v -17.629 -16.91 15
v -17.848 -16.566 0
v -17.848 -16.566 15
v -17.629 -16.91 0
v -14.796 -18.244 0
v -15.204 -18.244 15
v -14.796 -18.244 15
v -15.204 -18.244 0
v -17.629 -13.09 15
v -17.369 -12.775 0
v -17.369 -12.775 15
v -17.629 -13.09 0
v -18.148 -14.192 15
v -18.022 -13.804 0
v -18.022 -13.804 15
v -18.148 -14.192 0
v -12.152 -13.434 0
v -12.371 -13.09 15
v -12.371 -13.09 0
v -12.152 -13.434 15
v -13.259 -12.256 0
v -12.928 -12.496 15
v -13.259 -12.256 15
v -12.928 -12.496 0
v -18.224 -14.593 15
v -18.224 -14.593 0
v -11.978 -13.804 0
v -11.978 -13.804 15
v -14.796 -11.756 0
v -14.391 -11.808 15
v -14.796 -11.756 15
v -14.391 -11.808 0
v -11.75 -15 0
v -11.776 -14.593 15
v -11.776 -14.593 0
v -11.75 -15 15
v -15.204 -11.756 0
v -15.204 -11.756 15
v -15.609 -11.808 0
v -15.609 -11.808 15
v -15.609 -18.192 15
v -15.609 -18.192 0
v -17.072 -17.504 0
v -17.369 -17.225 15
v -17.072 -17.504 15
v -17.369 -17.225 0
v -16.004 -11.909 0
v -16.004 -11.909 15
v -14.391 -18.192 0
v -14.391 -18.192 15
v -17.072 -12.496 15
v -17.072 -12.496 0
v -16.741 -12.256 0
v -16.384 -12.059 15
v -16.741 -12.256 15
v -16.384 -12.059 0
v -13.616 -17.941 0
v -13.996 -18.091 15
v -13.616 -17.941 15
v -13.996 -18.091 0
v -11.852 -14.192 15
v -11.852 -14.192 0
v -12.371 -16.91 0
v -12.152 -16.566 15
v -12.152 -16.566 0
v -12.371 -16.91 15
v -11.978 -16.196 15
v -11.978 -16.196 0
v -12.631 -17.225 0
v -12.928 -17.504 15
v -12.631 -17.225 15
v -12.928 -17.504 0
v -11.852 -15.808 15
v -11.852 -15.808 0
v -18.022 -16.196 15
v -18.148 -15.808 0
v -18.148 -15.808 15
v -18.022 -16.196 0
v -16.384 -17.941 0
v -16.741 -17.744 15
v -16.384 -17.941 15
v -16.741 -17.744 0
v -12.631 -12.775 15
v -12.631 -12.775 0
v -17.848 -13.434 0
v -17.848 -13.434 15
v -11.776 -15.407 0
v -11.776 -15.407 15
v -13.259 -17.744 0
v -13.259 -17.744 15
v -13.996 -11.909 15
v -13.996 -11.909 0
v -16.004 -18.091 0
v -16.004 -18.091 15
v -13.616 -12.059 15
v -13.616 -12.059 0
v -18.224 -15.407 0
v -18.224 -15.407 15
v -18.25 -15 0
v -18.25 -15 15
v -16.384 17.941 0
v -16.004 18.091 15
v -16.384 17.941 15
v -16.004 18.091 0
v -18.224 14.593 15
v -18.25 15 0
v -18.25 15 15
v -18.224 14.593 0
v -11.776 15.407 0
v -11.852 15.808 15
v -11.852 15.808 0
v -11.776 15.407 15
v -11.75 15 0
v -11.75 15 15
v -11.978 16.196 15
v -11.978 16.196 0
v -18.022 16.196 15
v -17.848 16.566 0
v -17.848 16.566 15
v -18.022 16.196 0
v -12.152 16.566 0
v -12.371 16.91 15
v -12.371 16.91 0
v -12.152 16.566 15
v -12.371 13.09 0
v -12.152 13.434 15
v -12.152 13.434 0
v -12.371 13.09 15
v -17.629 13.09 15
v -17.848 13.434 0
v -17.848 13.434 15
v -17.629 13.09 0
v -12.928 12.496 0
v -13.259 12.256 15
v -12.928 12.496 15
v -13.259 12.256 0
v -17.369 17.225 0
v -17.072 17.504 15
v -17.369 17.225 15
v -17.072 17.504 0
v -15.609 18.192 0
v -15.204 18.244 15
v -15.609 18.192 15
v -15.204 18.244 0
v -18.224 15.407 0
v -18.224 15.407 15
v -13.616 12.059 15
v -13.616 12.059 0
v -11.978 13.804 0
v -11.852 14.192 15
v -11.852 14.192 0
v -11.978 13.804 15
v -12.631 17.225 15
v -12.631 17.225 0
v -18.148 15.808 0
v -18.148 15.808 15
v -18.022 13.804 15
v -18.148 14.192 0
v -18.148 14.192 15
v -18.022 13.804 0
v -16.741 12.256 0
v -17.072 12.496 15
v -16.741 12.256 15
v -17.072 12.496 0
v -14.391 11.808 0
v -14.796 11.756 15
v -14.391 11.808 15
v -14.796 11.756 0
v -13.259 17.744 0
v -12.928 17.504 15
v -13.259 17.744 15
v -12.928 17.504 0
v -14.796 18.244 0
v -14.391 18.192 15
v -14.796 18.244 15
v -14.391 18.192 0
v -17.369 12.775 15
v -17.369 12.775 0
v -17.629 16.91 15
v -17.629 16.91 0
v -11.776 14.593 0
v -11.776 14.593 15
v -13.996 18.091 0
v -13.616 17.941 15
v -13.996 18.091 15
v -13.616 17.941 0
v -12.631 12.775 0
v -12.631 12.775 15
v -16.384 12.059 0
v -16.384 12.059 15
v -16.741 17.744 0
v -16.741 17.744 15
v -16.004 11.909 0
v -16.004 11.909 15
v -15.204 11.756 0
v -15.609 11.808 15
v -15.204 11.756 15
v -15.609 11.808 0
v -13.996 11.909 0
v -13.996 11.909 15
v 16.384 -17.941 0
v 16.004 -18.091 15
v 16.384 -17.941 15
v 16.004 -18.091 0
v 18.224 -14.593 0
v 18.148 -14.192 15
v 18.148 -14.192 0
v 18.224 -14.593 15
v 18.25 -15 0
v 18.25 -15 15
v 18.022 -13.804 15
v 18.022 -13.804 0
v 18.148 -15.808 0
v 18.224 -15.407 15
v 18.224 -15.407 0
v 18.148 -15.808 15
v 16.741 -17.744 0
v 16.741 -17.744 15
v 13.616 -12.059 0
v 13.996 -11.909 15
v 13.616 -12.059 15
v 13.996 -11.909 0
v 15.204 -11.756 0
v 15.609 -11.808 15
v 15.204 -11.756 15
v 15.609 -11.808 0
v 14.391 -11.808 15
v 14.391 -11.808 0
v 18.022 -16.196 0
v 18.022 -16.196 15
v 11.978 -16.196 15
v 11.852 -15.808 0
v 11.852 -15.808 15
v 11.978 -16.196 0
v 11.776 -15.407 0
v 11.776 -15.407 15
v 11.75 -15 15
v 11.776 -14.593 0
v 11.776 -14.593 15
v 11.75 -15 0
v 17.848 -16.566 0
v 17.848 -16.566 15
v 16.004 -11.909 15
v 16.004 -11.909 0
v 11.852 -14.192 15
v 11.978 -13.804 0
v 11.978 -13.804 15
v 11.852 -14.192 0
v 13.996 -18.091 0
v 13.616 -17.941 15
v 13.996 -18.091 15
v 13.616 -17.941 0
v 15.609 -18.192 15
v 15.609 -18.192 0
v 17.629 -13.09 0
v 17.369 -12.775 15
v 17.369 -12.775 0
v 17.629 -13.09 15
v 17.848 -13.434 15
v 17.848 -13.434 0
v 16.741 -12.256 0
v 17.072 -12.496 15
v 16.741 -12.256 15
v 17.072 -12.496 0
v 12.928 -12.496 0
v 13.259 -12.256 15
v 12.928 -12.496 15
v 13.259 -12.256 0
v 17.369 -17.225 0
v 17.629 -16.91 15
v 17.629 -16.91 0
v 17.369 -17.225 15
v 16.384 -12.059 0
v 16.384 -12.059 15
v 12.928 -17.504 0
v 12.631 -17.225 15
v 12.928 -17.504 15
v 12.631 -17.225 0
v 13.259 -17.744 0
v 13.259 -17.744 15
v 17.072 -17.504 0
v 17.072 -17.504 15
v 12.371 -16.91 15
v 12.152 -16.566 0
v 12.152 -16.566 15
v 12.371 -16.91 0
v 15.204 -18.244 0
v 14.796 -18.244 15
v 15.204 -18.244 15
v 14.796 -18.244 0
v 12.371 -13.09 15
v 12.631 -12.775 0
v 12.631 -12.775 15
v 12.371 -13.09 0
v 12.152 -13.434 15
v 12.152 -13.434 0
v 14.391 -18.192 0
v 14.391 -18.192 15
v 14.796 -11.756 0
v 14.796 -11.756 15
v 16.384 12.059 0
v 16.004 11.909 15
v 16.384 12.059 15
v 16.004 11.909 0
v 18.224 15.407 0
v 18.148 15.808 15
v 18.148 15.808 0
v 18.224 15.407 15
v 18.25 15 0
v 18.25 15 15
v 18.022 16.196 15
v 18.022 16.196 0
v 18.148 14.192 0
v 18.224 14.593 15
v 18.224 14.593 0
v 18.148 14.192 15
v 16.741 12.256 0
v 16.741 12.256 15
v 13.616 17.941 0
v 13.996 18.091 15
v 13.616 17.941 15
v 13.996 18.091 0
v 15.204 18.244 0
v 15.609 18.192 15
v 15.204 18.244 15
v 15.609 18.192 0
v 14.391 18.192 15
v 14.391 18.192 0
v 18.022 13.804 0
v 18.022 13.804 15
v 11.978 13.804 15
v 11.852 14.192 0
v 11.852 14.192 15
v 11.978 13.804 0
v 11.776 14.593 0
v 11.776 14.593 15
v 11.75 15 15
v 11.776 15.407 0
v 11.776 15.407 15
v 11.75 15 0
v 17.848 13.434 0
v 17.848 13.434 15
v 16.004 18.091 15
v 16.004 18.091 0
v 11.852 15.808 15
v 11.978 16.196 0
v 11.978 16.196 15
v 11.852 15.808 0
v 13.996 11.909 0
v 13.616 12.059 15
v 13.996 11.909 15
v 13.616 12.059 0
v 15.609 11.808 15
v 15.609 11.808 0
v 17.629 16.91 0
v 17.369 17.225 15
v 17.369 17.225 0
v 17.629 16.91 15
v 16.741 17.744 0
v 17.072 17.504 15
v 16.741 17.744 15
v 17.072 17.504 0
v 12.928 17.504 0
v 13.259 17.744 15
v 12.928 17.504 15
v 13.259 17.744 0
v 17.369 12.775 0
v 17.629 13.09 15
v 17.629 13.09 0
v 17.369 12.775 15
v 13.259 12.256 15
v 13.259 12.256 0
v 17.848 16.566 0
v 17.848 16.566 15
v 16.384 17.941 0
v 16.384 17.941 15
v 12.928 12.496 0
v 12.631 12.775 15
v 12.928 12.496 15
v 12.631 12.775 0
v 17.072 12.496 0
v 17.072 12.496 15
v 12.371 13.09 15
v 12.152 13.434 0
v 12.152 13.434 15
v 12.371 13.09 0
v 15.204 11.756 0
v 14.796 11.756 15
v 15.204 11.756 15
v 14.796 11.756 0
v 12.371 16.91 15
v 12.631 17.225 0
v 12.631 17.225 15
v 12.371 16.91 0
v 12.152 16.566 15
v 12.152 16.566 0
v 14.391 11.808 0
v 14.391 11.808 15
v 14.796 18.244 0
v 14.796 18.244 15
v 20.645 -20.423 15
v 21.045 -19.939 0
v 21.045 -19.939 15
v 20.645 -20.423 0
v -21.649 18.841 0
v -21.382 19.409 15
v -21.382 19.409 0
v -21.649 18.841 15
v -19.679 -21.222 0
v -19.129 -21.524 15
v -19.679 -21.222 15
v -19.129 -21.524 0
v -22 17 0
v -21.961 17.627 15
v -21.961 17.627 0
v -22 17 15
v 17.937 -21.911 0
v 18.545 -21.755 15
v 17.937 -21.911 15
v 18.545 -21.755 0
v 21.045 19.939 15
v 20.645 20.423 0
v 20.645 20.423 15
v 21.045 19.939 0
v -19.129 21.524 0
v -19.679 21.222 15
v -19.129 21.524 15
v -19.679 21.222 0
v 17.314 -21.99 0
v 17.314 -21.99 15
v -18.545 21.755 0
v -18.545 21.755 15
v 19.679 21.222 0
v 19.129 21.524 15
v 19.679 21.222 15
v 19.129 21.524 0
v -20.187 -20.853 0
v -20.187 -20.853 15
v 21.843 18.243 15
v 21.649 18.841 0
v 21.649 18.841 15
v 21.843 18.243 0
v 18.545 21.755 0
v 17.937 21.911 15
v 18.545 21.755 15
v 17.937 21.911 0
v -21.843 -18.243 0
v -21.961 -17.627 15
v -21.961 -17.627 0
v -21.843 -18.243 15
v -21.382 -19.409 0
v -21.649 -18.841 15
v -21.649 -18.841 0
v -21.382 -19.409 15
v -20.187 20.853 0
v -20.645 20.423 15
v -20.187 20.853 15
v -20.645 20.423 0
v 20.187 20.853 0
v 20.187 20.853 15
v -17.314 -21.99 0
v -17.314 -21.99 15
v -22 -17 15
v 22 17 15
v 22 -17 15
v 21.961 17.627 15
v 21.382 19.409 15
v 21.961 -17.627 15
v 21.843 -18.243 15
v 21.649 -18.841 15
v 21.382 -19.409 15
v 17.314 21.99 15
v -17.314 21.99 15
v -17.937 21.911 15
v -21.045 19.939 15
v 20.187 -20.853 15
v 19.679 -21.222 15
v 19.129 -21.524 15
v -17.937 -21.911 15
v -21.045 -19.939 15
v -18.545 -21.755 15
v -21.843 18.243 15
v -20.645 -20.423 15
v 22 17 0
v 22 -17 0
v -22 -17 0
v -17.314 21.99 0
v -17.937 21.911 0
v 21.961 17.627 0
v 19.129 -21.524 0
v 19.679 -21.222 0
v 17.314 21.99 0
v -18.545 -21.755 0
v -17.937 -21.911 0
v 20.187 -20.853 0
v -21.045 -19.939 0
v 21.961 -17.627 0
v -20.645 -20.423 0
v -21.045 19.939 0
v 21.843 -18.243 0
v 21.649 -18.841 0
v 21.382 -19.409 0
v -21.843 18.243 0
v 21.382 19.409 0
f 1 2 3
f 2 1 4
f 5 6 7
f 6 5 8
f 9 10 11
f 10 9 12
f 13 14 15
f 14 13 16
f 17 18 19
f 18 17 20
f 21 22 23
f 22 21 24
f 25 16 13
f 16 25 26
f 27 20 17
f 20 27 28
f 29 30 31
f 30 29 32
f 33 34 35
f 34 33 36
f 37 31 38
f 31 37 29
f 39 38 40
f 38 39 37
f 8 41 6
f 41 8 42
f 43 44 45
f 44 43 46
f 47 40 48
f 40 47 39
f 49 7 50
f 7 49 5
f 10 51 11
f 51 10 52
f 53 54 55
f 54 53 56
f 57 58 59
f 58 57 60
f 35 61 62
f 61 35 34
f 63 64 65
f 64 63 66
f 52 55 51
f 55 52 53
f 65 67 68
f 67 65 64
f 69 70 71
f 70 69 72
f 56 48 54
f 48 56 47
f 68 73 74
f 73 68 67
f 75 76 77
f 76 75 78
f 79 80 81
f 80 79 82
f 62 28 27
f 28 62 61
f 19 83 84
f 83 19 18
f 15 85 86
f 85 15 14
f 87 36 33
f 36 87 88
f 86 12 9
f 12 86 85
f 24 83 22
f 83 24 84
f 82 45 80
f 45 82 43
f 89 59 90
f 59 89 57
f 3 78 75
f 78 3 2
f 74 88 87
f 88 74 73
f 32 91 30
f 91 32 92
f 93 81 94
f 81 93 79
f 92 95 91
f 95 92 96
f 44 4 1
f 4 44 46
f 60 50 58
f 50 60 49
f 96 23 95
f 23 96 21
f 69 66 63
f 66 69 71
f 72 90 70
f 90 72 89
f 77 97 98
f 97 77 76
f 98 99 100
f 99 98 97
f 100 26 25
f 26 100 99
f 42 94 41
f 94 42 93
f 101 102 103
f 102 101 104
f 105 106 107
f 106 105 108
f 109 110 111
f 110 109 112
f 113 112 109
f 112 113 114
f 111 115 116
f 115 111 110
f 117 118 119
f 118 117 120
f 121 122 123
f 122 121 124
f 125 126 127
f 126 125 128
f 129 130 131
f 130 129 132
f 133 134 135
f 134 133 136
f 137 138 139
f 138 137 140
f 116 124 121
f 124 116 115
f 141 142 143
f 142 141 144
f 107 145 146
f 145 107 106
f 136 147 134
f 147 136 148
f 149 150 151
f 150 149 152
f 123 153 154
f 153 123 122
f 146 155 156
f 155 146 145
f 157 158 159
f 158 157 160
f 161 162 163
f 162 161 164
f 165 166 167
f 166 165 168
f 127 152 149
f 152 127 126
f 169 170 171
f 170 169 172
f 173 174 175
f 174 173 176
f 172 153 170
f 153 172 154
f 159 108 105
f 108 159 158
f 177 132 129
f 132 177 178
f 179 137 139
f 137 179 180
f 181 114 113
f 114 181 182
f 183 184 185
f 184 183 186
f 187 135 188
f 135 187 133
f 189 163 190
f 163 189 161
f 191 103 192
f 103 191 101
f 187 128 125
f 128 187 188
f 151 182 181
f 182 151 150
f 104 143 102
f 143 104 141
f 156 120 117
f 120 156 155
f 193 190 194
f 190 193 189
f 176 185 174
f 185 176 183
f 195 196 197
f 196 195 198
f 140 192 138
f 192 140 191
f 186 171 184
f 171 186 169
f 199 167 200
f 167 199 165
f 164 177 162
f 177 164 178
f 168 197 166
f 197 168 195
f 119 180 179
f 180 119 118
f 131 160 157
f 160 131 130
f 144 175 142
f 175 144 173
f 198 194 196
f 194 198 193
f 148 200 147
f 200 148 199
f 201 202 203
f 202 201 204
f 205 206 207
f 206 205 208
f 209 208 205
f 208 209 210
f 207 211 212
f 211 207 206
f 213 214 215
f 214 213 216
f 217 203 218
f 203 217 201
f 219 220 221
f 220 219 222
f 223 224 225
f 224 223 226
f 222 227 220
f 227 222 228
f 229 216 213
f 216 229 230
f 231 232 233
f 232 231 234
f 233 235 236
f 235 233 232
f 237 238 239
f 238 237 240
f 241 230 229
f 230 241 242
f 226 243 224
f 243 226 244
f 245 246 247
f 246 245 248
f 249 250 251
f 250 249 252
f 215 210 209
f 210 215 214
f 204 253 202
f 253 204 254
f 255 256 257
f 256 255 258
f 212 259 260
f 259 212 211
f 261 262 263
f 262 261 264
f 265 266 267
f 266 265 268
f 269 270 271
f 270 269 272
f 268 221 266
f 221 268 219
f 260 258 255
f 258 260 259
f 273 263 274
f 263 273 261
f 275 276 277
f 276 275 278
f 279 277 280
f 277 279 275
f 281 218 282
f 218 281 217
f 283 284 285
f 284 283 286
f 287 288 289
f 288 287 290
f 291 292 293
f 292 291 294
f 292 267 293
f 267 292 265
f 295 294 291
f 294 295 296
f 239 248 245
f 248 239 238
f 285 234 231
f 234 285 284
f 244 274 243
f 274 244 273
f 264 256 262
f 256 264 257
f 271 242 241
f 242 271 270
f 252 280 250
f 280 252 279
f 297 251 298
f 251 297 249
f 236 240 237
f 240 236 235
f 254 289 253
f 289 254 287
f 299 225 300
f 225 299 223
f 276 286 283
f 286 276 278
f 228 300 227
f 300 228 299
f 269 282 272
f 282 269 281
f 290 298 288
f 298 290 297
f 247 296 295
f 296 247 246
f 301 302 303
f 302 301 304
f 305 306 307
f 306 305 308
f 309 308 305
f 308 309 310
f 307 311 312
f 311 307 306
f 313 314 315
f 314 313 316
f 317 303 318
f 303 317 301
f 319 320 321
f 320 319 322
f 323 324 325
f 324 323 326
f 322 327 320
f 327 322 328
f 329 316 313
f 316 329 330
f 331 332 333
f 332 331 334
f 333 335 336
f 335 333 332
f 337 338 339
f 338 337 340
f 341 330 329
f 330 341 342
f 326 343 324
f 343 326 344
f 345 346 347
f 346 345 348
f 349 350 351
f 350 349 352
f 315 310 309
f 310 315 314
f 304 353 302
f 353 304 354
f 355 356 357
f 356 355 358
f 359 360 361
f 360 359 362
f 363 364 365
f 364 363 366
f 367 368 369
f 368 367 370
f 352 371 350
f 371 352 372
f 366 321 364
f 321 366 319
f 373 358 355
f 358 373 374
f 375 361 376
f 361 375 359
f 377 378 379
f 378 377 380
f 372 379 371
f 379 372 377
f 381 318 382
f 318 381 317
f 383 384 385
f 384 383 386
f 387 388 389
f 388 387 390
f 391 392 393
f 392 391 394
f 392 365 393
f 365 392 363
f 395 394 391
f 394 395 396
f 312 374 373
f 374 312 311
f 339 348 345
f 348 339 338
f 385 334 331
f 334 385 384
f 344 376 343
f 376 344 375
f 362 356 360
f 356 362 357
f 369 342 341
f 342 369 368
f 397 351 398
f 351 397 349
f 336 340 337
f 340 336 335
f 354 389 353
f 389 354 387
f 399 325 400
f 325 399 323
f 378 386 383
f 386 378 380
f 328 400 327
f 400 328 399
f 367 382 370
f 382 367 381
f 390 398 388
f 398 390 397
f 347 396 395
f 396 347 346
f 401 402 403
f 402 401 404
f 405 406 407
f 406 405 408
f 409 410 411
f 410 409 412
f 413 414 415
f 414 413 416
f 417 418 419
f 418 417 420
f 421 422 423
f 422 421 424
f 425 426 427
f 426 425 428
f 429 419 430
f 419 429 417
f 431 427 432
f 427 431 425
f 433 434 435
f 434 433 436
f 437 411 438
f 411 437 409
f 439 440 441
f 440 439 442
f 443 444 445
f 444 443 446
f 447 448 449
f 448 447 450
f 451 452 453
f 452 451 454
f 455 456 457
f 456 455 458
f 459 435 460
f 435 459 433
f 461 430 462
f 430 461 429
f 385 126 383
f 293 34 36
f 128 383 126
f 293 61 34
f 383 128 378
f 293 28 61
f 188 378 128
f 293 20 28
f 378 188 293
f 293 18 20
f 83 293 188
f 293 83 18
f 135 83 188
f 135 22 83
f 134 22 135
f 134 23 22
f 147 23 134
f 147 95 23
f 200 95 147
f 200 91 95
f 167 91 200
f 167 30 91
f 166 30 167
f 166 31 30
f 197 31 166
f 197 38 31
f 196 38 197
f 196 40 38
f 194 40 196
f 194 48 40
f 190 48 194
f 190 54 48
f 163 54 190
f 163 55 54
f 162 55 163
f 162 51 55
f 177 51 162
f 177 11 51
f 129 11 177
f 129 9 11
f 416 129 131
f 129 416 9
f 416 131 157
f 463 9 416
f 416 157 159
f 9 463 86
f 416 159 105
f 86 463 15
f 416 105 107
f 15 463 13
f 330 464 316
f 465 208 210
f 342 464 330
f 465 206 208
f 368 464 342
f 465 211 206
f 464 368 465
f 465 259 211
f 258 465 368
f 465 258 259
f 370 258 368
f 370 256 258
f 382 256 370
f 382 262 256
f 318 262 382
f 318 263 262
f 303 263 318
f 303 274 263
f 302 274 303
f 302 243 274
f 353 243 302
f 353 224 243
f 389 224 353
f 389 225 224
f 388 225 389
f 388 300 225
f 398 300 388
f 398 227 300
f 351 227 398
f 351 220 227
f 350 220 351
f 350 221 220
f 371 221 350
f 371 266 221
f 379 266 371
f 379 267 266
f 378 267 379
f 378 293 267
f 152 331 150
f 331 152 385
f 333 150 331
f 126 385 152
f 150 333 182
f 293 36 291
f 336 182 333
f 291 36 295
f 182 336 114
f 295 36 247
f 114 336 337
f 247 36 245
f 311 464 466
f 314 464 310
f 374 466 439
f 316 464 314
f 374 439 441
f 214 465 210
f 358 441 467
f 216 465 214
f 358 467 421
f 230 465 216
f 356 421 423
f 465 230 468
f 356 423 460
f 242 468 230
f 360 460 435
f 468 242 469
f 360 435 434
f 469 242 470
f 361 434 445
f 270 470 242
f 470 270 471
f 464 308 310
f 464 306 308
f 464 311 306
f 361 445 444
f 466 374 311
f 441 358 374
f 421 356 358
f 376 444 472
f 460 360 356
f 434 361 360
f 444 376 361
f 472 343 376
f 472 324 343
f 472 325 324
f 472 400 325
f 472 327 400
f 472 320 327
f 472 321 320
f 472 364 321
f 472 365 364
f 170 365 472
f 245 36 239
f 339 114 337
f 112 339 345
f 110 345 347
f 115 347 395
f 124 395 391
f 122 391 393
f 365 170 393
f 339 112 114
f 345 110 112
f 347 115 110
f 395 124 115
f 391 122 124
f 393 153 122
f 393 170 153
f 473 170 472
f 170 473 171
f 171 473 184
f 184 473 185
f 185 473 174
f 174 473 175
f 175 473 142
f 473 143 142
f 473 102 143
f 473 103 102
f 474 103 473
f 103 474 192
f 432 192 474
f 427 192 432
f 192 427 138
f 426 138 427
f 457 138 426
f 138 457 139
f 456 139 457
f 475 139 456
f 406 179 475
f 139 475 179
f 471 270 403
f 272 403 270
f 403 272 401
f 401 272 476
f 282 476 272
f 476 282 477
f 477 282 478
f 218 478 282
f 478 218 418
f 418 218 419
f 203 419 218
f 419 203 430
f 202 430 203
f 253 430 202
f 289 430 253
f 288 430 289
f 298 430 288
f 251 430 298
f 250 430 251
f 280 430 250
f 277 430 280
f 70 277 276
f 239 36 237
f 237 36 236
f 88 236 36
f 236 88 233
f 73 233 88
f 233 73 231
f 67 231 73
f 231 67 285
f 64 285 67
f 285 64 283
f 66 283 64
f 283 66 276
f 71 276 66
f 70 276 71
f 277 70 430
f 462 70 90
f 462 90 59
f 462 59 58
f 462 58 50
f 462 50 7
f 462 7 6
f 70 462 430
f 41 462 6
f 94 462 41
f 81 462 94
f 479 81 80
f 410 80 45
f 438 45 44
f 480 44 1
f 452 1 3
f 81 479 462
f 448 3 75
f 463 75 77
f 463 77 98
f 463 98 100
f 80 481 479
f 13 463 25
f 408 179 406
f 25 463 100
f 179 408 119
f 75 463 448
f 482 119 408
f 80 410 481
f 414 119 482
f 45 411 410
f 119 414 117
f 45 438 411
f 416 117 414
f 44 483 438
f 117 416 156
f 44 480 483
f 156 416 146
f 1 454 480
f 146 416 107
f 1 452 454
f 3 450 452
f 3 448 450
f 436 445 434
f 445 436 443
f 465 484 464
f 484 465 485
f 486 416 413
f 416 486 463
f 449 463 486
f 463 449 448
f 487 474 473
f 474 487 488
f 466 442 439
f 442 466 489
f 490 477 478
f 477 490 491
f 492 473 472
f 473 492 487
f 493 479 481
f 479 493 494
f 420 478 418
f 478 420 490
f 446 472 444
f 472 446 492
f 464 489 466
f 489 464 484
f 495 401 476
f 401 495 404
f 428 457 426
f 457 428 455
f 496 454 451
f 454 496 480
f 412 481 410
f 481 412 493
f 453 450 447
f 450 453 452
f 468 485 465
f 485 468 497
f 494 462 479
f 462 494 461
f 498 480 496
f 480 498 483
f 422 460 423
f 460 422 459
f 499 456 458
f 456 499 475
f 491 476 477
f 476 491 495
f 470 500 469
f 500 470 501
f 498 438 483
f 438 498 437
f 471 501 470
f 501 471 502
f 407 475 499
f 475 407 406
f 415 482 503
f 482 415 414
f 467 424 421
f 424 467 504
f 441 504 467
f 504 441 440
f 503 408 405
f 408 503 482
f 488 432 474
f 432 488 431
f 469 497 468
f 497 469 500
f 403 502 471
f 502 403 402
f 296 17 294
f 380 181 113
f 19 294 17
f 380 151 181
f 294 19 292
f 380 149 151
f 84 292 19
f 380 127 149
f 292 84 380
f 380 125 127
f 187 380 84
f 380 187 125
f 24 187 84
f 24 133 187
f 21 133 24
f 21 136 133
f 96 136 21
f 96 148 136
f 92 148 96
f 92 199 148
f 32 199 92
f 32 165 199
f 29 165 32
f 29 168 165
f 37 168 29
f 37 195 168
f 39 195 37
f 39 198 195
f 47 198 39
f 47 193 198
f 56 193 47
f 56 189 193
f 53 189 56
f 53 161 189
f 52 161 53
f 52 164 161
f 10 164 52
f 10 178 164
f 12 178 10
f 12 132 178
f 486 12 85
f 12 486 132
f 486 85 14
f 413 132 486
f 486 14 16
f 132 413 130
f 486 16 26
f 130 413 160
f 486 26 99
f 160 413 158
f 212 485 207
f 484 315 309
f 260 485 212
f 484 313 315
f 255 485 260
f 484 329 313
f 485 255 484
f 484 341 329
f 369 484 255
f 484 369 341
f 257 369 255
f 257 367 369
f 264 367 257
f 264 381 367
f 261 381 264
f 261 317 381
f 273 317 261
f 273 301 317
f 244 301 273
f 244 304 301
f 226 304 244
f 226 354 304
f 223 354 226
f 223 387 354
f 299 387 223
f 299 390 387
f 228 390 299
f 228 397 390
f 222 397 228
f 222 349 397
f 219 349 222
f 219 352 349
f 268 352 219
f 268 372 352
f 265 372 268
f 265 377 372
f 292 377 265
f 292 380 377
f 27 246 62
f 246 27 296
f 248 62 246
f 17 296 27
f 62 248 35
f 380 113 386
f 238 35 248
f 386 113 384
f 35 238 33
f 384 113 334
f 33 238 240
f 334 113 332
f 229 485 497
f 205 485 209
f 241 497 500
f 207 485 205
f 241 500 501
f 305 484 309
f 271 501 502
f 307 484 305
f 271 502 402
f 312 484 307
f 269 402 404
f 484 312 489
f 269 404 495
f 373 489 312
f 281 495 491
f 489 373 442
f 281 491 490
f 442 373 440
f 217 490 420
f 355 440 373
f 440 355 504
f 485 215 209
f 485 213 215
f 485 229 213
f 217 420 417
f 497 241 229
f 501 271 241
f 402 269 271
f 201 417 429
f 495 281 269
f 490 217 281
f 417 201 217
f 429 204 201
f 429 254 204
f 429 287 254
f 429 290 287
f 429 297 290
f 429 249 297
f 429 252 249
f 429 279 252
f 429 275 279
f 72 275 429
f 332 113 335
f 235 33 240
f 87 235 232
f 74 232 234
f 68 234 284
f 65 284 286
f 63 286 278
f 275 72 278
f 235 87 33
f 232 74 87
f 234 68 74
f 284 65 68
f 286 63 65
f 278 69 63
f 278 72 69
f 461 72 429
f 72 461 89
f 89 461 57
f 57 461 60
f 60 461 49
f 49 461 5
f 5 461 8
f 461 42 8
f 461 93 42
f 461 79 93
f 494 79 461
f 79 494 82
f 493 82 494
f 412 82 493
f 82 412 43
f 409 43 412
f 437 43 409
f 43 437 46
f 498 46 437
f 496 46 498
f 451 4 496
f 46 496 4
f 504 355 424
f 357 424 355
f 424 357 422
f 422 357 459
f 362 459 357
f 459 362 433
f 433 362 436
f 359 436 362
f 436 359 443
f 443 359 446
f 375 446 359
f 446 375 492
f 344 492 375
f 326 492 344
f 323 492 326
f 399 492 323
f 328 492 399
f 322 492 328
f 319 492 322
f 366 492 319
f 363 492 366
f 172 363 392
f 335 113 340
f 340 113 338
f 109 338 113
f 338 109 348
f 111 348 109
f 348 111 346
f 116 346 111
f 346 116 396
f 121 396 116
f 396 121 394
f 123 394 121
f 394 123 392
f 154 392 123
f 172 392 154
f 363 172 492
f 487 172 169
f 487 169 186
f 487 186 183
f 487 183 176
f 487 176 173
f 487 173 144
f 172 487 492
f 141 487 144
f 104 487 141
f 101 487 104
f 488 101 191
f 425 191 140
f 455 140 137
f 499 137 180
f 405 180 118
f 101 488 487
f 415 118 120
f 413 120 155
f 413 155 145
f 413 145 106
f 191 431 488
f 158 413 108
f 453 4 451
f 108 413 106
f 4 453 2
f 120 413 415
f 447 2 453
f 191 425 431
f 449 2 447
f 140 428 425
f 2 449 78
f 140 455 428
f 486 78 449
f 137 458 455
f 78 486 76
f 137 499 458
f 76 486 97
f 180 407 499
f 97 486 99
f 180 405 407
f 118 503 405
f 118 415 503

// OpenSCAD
$fn = 50;


difference() {
	union() {
		hull() {
			translate(v = [-17.0000000000, 17.0000000000, 0]) {
				cylinder(h = 15, r = 5);
			}
			translate(v = [17.0000000000, 17.0000000000, 0]) {
				cylinder(h = 15, r = 5);
			}
			translate(v = [-17.0000000000, -17.0000000000, 0]) {
				cylinder(h = 15, r = 5);
			}
			translate(v = [17.0000000000, -17.0000000000, 0]) {
				cylinder(h = 15, r = 5);
			}
		}
	}
	union() {
		translate(v = [-15.0000000000, -15.0000000000, -100.0000000000]) {
			cylinder(h = 200, r = 3.2500000000);
		}
		translate(v = [-15.0000000000, 15.0000000000, -100.0000000000]) {
			cylinder(h = 200, r = 3.2500000000);
		}
		translate(v = [15.0000000000, -15.0000000000, -100.0000000000]) {
			cylinder(h = 200, r = 3.2500000000);
		}
		translate(v = [15.0000000000, 15.0000000000, -100.0000000000]) {
			cylinder(h = 200, r = 3.2500000000);
		}
	}
}
